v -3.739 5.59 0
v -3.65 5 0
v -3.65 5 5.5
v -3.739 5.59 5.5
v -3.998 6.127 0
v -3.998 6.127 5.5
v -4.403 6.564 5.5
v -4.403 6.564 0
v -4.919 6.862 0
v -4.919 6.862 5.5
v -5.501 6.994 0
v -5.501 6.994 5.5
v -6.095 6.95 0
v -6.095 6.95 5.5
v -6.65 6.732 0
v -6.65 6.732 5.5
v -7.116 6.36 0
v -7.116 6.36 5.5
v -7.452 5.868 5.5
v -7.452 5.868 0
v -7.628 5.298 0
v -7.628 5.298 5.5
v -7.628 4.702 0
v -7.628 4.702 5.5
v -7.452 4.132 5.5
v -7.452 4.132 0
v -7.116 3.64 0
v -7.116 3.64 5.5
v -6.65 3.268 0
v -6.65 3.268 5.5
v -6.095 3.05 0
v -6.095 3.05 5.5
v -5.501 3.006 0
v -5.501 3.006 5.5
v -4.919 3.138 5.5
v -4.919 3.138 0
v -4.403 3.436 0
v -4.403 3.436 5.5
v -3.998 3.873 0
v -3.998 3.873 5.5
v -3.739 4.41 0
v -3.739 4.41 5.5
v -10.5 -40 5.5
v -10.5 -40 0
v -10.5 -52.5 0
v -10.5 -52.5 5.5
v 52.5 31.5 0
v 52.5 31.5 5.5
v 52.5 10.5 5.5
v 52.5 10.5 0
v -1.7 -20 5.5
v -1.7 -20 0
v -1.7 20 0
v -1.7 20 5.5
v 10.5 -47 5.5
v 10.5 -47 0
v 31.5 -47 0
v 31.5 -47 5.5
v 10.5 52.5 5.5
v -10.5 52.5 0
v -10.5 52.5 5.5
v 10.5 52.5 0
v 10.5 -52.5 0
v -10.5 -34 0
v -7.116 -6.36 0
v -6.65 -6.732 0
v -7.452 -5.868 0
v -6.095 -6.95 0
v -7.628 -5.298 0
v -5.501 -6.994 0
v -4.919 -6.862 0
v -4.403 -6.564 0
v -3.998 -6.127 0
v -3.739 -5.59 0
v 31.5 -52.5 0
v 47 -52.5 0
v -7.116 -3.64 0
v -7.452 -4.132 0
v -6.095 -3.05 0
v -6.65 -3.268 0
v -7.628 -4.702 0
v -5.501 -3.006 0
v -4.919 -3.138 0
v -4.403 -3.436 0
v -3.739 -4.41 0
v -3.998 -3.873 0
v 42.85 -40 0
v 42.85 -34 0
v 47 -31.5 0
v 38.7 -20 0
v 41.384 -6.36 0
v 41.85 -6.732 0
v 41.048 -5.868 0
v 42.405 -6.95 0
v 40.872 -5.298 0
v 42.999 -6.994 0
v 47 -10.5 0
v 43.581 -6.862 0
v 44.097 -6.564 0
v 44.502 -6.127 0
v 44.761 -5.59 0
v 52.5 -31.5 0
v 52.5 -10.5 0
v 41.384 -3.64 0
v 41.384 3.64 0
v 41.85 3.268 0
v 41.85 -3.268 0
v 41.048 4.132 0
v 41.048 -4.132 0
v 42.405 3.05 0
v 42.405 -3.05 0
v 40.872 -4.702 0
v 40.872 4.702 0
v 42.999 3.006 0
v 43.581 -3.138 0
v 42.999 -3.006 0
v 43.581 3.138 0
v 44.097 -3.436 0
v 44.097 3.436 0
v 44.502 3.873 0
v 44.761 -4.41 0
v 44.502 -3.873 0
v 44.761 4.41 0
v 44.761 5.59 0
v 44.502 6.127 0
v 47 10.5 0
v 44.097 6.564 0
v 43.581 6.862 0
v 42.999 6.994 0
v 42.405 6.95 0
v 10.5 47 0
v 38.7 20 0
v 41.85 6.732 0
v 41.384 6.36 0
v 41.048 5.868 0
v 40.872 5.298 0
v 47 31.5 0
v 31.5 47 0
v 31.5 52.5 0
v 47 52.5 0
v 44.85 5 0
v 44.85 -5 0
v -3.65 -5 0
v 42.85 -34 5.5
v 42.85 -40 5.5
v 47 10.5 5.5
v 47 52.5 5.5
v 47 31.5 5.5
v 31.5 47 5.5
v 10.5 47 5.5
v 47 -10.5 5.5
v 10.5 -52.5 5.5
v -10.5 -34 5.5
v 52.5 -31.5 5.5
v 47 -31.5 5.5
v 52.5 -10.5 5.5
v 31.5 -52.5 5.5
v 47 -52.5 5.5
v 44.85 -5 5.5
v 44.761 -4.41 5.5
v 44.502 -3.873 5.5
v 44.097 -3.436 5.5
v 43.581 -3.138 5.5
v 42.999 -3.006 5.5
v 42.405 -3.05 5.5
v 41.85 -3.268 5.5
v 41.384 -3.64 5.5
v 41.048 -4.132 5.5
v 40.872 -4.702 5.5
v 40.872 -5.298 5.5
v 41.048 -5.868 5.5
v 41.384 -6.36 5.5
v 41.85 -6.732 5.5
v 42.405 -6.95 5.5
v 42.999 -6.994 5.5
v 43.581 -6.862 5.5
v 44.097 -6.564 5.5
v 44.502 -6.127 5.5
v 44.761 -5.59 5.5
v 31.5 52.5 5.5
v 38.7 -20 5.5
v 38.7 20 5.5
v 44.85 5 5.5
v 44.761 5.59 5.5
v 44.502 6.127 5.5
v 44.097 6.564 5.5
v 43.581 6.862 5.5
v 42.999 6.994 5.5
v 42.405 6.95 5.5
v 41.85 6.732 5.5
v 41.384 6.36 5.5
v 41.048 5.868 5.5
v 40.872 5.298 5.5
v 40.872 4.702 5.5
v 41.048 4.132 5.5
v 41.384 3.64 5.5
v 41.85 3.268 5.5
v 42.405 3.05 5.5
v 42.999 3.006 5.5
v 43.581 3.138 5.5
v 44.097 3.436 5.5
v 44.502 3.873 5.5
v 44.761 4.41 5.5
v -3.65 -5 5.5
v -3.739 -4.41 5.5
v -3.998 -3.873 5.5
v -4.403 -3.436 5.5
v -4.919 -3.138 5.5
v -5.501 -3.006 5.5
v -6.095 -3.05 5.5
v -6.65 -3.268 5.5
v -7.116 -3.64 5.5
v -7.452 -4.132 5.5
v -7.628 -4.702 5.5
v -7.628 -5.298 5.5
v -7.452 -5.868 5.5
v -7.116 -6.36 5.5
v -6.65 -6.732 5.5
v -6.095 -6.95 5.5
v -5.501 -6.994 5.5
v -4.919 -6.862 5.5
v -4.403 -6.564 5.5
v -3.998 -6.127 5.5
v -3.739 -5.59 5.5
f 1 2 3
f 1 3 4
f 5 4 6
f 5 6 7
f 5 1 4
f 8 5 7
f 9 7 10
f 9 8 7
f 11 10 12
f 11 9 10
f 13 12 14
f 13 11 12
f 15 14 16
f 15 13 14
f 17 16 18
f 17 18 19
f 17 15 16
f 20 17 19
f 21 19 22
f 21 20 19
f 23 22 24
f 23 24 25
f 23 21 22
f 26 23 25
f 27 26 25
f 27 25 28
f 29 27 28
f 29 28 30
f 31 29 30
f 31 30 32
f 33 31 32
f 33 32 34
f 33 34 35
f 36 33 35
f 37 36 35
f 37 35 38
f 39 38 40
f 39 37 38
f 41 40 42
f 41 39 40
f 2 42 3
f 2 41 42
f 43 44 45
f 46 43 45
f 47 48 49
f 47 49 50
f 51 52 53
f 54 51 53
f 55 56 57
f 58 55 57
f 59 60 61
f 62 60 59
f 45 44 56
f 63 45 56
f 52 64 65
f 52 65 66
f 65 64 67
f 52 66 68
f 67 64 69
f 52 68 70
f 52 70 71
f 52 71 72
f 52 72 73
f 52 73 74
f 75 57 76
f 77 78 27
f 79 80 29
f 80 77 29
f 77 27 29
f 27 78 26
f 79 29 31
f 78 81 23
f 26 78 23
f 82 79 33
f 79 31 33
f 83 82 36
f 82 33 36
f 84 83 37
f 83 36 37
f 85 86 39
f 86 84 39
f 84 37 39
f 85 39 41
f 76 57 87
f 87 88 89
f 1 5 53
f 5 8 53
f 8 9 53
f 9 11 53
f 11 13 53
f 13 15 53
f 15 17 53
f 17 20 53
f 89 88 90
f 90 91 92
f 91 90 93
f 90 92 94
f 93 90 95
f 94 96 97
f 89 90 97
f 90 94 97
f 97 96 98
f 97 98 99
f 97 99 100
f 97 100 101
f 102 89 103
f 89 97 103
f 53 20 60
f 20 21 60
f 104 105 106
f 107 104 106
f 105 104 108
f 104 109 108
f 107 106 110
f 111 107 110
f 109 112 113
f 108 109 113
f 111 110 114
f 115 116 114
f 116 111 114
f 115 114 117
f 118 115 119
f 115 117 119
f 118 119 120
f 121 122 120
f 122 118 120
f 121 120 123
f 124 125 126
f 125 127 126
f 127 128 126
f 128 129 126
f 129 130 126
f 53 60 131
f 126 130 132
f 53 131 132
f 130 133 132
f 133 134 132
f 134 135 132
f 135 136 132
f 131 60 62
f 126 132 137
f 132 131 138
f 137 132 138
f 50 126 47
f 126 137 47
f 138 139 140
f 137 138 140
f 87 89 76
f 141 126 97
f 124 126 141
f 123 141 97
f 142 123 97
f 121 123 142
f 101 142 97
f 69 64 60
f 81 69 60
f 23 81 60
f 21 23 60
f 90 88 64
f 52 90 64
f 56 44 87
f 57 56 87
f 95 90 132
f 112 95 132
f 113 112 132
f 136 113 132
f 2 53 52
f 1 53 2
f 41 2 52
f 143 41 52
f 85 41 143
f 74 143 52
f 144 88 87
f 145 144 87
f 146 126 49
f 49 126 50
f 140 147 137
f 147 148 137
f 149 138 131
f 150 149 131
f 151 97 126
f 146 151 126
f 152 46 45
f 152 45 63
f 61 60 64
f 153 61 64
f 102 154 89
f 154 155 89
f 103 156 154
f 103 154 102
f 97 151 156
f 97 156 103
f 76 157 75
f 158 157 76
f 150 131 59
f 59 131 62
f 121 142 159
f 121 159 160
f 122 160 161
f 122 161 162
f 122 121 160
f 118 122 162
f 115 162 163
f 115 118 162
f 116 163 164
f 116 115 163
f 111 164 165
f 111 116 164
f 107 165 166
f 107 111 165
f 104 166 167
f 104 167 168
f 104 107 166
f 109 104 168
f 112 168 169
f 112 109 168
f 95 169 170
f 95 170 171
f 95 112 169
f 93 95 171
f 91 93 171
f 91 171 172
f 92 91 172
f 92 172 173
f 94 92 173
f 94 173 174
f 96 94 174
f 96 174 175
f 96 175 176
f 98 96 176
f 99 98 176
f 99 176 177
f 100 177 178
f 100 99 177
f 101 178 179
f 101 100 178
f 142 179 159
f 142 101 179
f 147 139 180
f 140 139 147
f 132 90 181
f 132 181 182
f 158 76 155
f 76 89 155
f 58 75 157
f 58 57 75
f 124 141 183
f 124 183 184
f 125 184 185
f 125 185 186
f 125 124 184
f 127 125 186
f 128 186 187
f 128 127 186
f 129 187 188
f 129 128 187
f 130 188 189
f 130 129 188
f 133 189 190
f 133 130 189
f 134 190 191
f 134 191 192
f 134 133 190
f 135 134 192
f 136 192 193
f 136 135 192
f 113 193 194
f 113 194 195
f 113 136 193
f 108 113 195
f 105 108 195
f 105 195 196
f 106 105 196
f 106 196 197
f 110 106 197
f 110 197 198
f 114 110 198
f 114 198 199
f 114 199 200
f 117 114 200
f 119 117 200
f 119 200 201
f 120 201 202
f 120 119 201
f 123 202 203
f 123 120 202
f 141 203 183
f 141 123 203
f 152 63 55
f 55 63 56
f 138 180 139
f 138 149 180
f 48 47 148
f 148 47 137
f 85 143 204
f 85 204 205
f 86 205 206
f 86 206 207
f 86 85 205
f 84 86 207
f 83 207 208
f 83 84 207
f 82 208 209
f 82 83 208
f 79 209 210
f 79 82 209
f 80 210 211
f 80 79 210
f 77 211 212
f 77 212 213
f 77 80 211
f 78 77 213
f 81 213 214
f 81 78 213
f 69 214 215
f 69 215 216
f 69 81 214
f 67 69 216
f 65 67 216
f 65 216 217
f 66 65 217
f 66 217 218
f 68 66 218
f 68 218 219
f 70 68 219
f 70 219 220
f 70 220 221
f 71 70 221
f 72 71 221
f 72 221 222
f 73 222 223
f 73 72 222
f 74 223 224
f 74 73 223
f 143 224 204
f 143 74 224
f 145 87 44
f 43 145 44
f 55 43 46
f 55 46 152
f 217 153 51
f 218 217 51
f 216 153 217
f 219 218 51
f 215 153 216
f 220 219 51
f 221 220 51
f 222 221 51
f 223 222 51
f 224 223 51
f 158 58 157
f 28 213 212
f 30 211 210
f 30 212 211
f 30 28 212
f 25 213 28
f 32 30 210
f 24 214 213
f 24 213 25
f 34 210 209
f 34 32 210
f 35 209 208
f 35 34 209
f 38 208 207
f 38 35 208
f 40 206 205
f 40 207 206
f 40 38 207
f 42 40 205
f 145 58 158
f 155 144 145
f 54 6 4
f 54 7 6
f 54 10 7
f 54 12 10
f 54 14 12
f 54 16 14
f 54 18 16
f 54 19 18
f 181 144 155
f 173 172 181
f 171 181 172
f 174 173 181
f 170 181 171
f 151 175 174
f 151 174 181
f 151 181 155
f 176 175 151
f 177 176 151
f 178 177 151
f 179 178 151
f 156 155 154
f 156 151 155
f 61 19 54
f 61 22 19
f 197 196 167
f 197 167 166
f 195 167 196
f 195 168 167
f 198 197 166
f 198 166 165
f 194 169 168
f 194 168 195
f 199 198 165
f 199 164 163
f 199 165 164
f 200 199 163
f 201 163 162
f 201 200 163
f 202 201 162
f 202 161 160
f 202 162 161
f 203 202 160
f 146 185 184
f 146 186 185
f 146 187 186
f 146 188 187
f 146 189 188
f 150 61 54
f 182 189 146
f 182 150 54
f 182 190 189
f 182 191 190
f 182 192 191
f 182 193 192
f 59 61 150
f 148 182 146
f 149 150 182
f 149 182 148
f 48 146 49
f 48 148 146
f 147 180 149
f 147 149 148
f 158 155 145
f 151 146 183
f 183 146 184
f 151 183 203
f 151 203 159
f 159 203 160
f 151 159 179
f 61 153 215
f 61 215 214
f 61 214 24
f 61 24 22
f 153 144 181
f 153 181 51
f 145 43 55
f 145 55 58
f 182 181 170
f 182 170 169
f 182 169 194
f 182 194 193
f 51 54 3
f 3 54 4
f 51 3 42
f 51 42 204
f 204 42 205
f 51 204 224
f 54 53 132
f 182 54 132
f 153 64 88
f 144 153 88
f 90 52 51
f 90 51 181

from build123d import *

# Parameters (mm, degrees)
CROQUIS2_R              = 2
CROQUIS2_W              = 40.4
CROQUIS2_H              = 40
SALIENTE_EXTRUIR1_DEPTH = 5.5
CROQUIS3_W              = 5.5
CROQUIS3_H              = 21
SALIENTE_EXTRUIR2_DEPTH = 2.5
CROQUIS4_W              = 15.5
CROQUIS4_H              = 5.5
CROQUIS4_W_2            = 21
SALIENTE_EXTRUIR3_DEPTH = 2.5
CROQUIS5_W              = 15.5
CROQUIS5_H              = 5.5
CROQUIS5_W_2            = 21
SALIENTE_EXTRUIR4_DEPTH = 2.5


with BuildPart() as part:
    # Croquis2 → Saliente-Extruir1 (new body)
    with BuildSketch(Plane.XY):
        Polygon((-10.5, 50), (-10.5, -34), (42.85, -34), (42.85, -40), (-10.5, -40), (-10.5, -50), (10.5, -50), (10.5, -47), (31.5, -47), (31.5, -50), (47, -50), (47, -31.5), (50, -31.5), (50, -10.5), (47, -10.5), (47, 10.5), (50, 10.5), (50, 31.5), (47, 31.5), (47, 50), (31.5, 50), (31.5, 47), (10.5, 47), (10.5, 50), align=None)
        with Locations((42.85, 5)):
            Circle(CROQUIS2_R, mode=Mode.SUBTRACT)
        with Locations((-5.65, 5)):
            Circle(CROQUIS2_R, mode=Mode.SUBTRACT)
        with Locations((42.85, -5)):
            Circle(CROQUIS2_R, mode=Mode.SUBTRACT)
        with Locations((-5.65, -5)):
            Circle(CROQUIS2_R, mode=Mode.SUBTRACT)
        with Locations((18.5, 0)):
            Rectangle(CROQUIS2_W, CROQUIS2_H, mode=Mode.SUBTRACT)
    extrude(amount=SALIENTE_EXTRUIR1_DEPTH)

    # Croquis3 → Saliente-Extruir2 (add)
    with BuildSketch(Plane(origin=(50, 0, 0), x_dir=(0, 0, -1), z_dir=(1, 0, 0))):
        with Locations((-2.75, -21)):
            Rectangle(CROQUIS3_W, CROQUIS3_H)
        with Locations((-2.75, 21)):
            Rectangle(CROQUIS3_W, CROQUIS3_H)
    extrude(amount=SALIENTE_EXTRUIR2_DEPTH)

    # Croquis4 → Saliente-Extruir3 (add)
    with BuildSketch(Plane(origin=(0, 50, 0), x_dir=(1, 0, 0), z_dir=(0, 1, 0))):
        with Locations((39.25, -2.75)):
            Rectangle(CROQUIS4_W, CROQUIS4_H)
        with Locations((0, -2.75)):
            Rectangle(CROQUIS4_W_2, CROQUIS4_H)
    extrude(amount=SALIENTE_EXTRUIR3_DEPTH)

    # Croquis5 → Saliente-Extruir4 (add)
    with BuildSketch(Plane.XZ.offset(50)):
        with Locations((39.25, 2.75)):
            Rectangle(CROQUIS5_W, CROQUIS5_H)
        with Locations((0, 2.75)):
            Rectangle(CROQUIS5_W_2, CROQUIS5_H)
    extrude(amount=SALIENTE_EXTRUIR4_DEPTH)


solid = part.part
